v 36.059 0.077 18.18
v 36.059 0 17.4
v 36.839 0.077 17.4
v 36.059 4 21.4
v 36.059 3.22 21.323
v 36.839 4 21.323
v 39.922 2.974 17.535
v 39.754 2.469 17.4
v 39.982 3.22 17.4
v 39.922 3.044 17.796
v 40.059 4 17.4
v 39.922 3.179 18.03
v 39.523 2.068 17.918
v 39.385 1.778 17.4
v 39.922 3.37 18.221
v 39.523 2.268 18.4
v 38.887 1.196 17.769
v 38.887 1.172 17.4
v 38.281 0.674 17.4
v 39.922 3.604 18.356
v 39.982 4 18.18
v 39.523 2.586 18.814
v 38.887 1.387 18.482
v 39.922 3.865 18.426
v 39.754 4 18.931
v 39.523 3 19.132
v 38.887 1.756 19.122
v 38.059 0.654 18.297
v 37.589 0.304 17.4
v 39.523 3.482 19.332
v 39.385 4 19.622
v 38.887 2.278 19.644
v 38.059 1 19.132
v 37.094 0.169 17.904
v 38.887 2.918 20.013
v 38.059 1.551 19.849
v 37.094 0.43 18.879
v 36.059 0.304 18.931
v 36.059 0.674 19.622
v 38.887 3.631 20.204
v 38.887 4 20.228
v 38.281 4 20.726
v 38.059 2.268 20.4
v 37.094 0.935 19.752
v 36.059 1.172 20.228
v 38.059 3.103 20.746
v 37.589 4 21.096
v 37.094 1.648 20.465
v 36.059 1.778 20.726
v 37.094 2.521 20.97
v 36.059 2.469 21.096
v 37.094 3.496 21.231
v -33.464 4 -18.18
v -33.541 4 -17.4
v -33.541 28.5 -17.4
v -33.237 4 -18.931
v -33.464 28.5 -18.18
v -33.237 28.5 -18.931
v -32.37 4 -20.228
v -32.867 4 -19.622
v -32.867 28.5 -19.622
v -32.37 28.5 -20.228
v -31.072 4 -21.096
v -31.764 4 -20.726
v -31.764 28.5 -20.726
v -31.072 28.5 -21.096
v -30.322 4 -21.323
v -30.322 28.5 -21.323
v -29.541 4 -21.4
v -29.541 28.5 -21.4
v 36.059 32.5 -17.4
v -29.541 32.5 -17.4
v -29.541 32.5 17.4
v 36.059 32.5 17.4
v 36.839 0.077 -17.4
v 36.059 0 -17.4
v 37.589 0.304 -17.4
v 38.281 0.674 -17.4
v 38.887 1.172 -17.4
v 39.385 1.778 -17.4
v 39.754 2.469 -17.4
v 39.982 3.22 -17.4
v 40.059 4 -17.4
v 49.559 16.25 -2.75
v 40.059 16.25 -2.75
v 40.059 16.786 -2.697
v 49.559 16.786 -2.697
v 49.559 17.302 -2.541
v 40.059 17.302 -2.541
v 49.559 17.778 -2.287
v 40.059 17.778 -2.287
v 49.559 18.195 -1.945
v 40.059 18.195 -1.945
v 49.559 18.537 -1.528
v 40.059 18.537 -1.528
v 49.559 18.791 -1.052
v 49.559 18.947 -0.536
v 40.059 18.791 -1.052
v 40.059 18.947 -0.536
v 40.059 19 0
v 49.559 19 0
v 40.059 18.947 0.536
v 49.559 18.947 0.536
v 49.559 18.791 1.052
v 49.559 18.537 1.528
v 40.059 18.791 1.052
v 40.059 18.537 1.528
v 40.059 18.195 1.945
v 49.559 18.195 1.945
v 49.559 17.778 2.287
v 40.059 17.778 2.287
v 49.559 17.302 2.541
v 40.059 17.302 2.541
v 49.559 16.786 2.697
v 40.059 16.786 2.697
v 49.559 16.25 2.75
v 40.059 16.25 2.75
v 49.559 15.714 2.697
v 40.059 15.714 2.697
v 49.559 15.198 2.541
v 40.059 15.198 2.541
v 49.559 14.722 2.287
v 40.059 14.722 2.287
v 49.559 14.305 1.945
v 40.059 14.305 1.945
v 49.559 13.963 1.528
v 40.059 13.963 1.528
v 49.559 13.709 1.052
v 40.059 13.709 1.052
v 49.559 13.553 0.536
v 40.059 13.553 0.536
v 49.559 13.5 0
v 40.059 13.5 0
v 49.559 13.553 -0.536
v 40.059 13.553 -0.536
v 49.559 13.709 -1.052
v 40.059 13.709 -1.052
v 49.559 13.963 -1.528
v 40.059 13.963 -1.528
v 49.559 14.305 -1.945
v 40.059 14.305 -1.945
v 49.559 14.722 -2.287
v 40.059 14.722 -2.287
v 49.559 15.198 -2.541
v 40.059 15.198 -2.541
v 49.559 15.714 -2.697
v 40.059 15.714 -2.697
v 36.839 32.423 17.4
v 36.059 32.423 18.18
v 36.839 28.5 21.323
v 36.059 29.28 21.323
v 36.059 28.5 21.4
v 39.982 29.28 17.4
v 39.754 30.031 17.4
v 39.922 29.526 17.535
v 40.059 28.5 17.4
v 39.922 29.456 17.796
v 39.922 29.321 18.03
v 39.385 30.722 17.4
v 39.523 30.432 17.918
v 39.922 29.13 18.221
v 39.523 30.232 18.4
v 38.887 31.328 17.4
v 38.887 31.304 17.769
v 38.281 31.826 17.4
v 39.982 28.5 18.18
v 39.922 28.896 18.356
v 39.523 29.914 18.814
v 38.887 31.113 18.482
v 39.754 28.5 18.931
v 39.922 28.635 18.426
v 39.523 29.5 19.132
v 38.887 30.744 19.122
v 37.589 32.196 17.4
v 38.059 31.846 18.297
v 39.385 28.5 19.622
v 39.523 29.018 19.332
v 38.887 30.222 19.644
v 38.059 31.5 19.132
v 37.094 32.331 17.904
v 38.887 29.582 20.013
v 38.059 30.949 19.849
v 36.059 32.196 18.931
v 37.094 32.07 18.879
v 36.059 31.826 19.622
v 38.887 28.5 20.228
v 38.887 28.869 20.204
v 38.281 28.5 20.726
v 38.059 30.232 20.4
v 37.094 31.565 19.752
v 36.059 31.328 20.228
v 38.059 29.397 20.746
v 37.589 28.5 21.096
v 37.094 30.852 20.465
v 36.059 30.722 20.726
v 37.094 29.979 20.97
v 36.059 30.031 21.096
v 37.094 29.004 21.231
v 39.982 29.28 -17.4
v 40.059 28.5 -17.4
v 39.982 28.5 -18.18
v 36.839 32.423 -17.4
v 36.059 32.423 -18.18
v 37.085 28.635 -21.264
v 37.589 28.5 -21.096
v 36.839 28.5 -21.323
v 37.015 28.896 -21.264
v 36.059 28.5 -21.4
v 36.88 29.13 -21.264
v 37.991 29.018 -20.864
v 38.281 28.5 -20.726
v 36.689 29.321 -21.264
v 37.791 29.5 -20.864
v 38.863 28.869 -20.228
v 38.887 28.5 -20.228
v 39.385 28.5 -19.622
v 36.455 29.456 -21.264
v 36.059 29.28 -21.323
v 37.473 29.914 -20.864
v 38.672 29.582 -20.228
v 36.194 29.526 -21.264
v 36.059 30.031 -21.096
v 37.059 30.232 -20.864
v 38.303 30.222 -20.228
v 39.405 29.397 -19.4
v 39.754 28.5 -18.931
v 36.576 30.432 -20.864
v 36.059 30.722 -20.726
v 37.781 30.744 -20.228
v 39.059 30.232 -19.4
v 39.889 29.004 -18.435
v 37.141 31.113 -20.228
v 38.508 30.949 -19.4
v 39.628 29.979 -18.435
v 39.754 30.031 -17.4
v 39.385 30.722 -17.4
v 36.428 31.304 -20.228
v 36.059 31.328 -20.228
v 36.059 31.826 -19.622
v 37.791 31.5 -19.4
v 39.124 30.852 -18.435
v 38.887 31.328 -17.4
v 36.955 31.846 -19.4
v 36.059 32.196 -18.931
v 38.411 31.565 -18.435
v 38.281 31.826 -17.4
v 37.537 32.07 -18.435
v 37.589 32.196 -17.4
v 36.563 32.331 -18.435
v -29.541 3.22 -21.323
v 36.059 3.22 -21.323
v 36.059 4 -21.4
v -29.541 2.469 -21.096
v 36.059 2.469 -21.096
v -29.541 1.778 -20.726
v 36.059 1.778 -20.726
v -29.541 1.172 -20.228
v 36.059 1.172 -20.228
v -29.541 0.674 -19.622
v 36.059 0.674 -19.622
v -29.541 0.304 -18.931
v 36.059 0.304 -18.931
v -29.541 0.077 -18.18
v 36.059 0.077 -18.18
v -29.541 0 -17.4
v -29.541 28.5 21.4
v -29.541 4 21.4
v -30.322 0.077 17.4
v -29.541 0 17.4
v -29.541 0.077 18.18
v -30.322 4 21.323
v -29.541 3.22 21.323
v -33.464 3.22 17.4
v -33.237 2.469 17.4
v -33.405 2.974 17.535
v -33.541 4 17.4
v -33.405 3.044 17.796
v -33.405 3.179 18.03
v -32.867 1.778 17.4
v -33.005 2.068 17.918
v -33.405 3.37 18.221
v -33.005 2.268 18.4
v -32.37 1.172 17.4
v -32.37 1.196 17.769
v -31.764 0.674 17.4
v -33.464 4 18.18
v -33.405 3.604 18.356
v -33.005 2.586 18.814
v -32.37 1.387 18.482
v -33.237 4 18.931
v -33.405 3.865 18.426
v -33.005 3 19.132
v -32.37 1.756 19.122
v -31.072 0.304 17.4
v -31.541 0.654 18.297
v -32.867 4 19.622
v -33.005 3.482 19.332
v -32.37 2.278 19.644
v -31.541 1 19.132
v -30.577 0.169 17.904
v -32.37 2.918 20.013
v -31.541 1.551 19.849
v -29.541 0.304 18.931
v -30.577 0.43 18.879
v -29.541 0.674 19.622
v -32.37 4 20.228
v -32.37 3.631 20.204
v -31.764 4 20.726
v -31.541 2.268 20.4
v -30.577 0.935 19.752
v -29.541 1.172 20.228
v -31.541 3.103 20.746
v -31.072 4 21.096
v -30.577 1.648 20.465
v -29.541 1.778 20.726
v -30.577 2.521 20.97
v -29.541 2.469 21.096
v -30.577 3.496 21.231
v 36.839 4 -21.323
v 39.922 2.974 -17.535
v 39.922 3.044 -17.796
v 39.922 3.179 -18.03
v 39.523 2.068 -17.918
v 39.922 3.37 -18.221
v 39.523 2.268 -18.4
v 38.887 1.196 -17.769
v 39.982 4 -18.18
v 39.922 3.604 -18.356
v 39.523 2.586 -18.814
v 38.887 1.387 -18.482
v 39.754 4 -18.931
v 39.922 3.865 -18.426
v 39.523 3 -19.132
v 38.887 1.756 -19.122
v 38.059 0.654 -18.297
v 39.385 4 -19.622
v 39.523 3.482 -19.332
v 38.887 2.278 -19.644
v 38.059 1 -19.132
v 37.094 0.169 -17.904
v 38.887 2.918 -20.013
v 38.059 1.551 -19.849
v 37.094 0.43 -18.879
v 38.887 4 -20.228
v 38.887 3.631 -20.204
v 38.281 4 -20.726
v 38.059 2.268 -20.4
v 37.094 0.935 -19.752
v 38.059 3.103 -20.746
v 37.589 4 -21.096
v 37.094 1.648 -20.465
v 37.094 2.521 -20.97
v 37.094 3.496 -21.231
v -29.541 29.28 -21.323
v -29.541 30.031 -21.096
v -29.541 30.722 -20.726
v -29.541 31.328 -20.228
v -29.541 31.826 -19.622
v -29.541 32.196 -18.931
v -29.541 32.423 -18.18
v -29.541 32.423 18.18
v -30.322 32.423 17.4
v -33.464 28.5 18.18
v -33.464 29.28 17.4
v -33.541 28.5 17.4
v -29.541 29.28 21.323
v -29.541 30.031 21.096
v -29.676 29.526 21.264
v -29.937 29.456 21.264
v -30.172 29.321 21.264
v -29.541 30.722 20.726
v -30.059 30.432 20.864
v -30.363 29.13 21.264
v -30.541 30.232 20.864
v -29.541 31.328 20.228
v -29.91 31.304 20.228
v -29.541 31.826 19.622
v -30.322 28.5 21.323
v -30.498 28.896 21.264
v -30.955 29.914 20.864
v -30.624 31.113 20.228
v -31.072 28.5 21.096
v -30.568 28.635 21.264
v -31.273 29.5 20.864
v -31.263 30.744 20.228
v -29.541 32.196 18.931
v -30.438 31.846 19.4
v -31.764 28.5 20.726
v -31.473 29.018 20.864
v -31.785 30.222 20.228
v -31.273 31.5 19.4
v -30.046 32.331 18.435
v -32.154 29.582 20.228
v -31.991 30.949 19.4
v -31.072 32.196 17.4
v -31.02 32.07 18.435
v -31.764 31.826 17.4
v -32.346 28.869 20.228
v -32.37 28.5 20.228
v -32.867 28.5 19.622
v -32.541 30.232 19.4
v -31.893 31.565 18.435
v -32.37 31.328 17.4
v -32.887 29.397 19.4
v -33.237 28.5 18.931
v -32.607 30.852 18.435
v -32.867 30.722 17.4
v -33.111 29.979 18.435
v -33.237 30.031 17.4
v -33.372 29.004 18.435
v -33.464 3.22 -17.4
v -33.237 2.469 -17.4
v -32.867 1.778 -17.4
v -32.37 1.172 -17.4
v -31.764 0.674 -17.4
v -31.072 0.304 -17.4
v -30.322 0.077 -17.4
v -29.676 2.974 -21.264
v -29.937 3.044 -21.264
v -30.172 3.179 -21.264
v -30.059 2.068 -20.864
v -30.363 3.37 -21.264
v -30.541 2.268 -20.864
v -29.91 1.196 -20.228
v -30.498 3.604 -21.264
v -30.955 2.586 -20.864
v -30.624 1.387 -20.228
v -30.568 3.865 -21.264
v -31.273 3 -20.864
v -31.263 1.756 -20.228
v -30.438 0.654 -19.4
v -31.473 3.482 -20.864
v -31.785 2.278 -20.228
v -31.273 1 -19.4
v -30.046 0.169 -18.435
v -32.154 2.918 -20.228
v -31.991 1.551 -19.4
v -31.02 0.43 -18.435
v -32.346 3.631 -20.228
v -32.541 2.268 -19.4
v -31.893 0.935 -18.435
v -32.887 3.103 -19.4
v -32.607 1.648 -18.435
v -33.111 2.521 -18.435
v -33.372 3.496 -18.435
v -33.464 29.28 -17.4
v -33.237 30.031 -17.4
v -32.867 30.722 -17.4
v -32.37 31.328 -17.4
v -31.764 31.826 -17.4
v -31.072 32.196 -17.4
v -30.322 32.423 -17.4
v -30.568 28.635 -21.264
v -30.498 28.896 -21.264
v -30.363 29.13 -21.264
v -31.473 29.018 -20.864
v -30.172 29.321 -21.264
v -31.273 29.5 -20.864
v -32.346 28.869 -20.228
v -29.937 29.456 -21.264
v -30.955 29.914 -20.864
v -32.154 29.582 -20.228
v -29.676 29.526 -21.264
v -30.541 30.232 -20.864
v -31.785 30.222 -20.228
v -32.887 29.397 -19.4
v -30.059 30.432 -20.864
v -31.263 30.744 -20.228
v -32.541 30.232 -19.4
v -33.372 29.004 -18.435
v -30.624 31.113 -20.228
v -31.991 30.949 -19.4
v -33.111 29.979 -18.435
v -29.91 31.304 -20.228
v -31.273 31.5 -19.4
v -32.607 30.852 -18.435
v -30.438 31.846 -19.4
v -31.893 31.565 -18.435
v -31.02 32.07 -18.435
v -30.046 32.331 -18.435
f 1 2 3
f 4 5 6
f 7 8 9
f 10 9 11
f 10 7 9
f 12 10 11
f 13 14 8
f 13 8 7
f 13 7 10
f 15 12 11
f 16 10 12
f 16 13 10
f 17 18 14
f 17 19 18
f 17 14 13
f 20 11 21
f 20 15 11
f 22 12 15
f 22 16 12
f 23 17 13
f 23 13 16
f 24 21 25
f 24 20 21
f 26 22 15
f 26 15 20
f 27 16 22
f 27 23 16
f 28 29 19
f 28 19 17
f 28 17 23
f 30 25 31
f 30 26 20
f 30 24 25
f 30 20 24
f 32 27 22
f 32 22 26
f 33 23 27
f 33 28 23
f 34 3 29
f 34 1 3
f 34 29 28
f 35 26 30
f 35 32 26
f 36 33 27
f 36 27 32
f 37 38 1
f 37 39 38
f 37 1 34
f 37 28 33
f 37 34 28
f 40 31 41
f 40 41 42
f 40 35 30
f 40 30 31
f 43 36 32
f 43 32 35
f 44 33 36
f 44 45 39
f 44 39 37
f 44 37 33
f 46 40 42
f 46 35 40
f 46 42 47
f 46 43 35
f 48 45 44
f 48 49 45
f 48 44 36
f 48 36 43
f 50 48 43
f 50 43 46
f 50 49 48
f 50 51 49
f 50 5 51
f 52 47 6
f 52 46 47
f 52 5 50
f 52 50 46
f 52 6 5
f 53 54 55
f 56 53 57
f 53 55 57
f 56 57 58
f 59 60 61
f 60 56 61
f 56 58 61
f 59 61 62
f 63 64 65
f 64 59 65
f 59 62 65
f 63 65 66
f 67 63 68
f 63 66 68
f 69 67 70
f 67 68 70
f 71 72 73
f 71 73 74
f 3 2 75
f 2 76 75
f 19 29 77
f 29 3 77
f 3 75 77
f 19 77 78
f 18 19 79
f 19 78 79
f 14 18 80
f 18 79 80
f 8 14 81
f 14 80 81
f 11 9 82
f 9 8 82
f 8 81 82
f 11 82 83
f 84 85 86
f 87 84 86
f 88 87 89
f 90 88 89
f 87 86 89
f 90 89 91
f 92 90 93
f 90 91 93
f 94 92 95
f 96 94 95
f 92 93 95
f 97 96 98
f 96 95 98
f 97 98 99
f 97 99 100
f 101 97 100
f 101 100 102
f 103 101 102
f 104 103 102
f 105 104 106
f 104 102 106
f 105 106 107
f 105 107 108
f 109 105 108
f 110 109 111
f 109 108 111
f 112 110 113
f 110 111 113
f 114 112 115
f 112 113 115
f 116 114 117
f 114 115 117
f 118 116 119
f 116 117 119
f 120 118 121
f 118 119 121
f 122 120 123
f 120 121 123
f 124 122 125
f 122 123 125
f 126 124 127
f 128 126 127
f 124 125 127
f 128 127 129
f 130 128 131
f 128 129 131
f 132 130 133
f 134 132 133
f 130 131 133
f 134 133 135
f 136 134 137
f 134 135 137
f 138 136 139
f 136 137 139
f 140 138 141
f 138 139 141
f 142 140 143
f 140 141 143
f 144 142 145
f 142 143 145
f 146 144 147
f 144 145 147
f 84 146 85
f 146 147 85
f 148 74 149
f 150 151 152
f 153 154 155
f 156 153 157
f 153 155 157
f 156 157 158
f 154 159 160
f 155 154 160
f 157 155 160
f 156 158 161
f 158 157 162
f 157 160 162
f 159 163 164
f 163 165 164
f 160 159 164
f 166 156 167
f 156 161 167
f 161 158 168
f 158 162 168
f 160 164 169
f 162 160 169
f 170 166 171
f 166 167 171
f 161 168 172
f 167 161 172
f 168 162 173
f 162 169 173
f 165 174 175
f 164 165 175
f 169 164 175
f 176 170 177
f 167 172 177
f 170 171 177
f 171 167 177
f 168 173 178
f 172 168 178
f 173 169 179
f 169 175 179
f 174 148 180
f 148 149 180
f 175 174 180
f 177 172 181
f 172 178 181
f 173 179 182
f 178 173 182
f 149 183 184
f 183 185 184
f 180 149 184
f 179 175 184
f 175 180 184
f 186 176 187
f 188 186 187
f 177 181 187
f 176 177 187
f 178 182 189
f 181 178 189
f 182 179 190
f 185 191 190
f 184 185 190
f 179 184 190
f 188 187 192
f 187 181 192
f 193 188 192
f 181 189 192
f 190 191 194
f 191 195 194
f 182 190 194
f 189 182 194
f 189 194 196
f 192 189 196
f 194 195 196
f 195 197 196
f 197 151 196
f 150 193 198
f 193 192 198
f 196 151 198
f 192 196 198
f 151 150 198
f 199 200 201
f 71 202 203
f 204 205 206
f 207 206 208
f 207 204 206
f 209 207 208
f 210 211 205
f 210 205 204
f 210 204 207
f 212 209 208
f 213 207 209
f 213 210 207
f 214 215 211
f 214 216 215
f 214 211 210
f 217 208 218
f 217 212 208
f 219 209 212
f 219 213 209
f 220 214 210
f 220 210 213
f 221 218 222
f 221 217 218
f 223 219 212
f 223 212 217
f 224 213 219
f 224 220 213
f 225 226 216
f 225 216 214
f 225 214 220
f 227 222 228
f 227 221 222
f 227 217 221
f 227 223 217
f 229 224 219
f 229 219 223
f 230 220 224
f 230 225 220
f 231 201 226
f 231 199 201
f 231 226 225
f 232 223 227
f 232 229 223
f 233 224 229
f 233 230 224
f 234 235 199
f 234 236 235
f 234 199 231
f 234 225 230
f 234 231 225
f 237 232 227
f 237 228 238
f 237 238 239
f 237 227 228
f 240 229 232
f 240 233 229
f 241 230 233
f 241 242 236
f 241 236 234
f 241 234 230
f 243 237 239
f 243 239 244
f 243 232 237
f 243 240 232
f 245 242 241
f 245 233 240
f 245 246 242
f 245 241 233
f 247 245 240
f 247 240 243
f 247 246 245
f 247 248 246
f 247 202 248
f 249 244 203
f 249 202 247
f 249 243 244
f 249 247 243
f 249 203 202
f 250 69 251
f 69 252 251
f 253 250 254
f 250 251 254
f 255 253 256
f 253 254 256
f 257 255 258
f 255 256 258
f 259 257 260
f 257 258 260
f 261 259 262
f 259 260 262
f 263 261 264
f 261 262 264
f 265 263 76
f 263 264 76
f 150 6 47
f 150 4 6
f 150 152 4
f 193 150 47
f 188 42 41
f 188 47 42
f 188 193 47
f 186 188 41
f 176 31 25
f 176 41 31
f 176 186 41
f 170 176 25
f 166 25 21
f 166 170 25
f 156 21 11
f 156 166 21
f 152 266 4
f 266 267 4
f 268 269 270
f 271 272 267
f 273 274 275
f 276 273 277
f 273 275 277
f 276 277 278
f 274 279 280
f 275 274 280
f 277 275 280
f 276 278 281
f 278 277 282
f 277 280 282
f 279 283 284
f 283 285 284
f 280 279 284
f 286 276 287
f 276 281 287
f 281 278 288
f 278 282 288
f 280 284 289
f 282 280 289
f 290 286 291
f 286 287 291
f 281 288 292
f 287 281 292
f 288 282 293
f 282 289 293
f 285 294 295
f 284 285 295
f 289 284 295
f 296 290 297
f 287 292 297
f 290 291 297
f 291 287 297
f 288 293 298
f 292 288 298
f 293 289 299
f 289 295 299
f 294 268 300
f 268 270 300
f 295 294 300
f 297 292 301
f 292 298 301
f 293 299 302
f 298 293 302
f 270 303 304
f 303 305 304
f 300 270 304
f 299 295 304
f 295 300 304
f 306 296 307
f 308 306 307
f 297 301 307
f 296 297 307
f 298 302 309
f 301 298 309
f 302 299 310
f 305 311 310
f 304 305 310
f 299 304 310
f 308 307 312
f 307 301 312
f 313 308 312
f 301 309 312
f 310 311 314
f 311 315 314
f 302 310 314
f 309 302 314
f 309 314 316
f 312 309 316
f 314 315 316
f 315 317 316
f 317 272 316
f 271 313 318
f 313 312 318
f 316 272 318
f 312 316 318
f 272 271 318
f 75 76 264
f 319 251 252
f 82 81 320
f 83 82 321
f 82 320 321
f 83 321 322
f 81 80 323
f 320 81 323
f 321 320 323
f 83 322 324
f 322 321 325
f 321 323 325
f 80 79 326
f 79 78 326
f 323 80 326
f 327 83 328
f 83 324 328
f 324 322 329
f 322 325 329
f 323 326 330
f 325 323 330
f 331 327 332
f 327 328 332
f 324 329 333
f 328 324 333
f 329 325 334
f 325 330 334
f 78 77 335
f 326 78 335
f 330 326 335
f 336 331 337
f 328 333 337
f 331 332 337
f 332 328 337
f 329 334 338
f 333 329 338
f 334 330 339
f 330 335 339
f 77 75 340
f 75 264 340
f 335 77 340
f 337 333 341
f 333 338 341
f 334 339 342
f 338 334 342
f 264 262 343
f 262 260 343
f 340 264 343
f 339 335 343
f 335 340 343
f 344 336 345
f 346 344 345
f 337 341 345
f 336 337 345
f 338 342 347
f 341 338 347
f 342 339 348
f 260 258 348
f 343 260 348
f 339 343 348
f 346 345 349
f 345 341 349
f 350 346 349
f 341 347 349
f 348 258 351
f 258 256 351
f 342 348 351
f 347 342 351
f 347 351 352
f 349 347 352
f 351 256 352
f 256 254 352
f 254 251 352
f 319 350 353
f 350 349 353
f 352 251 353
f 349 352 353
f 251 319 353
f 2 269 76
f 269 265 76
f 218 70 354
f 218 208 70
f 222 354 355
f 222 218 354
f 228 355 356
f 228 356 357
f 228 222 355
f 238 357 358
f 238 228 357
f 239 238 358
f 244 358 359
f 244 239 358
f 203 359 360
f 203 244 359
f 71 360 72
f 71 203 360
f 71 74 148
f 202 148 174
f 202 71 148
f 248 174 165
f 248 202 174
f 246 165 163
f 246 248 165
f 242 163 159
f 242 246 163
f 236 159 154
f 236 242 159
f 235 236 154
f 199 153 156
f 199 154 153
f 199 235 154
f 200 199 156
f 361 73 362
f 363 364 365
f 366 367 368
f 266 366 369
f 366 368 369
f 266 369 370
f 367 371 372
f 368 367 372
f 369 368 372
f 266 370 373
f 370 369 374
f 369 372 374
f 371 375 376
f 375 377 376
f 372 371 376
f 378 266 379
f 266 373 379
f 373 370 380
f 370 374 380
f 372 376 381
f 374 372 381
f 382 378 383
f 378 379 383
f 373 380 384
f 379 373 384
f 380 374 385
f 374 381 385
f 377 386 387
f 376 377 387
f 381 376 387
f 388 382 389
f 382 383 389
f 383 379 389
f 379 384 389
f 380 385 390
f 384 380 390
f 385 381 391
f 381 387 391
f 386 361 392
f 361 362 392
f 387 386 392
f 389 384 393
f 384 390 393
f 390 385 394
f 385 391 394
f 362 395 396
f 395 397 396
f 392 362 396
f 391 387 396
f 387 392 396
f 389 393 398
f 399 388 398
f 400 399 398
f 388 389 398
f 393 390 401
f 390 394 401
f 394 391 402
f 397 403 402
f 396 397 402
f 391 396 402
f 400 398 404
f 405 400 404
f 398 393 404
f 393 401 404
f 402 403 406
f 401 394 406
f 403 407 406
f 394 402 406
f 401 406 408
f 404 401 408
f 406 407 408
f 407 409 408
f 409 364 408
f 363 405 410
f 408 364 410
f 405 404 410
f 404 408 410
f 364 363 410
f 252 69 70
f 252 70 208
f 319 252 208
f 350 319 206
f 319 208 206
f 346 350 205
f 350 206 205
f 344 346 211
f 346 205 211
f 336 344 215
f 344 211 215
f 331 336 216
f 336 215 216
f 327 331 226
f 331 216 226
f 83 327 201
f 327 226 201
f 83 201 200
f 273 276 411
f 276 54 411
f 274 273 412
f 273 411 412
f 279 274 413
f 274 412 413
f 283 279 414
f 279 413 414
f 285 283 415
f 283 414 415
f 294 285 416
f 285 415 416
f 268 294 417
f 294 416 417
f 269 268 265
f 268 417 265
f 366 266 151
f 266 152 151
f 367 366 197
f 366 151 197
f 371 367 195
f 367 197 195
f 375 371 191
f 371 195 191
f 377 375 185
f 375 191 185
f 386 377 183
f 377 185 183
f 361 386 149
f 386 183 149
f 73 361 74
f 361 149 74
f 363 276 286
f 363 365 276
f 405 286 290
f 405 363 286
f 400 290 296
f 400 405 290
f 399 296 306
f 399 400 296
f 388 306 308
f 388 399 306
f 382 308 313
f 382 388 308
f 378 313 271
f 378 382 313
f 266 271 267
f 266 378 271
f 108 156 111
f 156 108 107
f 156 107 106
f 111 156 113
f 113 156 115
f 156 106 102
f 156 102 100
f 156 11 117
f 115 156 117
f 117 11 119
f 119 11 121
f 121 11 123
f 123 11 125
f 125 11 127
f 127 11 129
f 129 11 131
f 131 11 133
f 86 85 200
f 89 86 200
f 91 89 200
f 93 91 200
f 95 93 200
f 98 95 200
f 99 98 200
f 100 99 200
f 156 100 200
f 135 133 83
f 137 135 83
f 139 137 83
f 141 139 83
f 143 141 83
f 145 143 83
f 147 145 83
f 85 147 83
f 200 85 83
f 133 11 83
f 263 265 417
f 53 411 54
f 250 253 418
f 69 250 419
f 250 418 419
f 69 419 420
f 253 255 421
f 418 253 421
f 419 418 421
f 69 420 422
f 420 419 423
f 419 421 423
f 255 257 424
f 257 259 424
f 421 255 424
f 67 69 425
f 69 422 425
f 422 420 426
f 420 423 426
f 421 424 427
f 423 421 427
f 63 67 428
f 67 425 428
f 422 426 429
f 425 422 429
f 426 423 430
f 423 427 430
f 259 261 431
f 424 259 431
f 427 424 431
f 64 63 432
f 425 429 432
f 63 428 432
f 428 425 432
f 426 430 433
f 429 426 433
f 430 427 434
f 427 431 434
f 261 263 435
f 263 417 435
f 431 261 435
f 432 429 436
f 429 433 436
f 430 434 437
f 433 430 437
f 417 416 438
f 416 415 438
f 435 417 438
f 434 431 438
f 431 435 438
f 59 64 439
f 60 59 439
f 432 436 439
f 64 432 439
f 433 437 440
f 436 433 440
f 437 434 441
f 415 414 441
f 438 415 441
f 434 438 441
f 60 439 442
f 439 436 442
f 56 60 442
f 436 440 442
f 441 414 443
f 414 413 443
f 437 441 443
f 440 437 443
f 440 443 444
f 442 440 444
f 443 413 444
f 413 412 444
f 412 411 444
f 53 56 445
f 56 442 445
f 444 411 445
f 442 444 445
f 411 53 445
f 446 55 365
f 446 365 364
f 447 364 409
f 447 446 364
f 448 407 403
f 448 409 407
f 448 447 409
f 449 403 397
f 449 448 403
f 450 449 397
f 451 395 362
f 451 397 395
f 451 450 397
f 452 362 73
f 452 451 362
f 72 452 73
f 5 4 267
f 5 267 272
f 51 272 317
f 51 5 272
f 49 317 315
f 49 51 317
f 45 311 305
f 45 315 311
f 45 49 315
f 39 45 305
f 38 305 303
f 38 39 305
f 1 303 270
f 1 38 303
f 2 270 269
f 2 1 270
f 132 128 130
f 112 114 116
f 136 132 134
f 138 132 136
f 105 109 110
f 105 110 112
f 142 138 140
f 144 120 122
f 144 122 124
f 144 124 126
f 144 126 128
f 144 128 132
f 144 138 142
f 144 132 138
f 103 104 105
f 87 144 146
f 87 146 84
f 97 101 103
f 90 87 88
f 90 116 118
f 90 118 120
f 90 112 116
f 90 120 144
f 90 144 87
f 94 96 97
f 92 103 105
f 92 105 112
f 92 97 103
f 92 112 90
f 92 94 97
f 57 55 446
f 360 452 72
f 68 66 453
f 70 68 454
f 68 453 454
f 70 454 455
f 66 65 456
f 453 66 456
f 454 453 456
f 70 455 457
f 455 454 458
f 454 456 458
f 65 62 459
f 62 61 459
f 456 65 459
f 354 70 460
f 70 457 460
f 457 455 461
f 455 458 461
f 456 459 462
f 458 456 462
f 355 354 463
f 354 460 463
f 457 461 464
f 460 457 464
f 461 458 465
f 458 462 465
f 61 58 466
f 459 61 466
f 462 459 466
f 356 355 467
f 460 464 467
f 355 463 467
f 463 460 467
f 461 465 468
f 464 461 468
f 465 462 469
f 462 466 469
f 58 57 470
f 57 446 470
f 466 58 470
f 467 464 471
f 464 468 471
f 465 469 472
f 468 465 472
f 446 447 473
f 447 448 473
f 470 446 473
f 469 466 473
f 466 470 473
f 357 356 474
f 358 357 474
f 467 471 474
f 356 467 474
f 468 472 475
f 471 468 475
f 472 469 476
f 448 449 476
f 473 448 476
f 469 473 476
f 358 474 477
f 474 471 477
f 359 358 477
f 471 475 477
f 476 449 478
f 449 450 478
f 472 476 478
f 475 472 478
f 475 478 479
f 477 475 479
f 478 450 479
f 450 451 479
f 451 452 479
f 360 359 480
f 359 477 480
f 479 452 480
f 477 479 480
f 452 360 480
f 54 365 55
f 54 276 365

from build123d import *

# Parameters (mm, degrees)
SKETCH1_W           = 73.6
SKETCH1_H           = 42.8
BOSS_EXTRUDE1_DEPTH = 32.5
SKETCH2_R           = 2.75
BOSS_EXTRUDE2_DEPTH = 9.5
FILLET1_R           = 4


with BuildPart() as part:
    # Sketch1 → Boss-Extrude1 (new body)
    with BuildSketch(Plane(origin=(0, 0, 0), x_dir=(1, 0, 0), z_dir=(0, 1, 0))):
        with Locations((3.258713578, 0)):
            Rectangle(SKETCH1_W, SKETCH1_H)
    extrude(amount=BOSS_EXTRUDE1_DEPTH)

    # Sketch2 → Boss-Extrude2 (add)
    with BuildSketch(Plane(origin=(40.058713578, 0, 0), x_dir=(0, 0, -1), z_dir=(1, 0, 0))):
        with Locations((0, 16.25)):
            Circle(SKETCH2_R)
    extrude(amount=BOSS_EXTRUDE2_DEPTH)

    # Fillet1
    fillet1_edges = [part.edges().sort_by_distance(p)[0] for p in [
        (-33.541286422, 32.5, 0),
        (3.258713578, 32.5, 21.4),
        (40.058713578, 32.5, 0),
        (3.258713578, 0, 21.4),
        (-33.541286422, 0, 0),
        (3.258713578, 0, -21.4),
        (40.058713578, 0, 0),
        (40.058713578, 16.25, 21.4),
        (-33.541286422, 16.25, 21.4),
        (-33.541286422, 16.25, -21.4),
        (40.058713578, 16.25, -21.4),
        (3.258713578, 32.5, -21.4),
    ]]
    fillet(fillet1_edges, radius=FILLET1_R)


solid = part.part
